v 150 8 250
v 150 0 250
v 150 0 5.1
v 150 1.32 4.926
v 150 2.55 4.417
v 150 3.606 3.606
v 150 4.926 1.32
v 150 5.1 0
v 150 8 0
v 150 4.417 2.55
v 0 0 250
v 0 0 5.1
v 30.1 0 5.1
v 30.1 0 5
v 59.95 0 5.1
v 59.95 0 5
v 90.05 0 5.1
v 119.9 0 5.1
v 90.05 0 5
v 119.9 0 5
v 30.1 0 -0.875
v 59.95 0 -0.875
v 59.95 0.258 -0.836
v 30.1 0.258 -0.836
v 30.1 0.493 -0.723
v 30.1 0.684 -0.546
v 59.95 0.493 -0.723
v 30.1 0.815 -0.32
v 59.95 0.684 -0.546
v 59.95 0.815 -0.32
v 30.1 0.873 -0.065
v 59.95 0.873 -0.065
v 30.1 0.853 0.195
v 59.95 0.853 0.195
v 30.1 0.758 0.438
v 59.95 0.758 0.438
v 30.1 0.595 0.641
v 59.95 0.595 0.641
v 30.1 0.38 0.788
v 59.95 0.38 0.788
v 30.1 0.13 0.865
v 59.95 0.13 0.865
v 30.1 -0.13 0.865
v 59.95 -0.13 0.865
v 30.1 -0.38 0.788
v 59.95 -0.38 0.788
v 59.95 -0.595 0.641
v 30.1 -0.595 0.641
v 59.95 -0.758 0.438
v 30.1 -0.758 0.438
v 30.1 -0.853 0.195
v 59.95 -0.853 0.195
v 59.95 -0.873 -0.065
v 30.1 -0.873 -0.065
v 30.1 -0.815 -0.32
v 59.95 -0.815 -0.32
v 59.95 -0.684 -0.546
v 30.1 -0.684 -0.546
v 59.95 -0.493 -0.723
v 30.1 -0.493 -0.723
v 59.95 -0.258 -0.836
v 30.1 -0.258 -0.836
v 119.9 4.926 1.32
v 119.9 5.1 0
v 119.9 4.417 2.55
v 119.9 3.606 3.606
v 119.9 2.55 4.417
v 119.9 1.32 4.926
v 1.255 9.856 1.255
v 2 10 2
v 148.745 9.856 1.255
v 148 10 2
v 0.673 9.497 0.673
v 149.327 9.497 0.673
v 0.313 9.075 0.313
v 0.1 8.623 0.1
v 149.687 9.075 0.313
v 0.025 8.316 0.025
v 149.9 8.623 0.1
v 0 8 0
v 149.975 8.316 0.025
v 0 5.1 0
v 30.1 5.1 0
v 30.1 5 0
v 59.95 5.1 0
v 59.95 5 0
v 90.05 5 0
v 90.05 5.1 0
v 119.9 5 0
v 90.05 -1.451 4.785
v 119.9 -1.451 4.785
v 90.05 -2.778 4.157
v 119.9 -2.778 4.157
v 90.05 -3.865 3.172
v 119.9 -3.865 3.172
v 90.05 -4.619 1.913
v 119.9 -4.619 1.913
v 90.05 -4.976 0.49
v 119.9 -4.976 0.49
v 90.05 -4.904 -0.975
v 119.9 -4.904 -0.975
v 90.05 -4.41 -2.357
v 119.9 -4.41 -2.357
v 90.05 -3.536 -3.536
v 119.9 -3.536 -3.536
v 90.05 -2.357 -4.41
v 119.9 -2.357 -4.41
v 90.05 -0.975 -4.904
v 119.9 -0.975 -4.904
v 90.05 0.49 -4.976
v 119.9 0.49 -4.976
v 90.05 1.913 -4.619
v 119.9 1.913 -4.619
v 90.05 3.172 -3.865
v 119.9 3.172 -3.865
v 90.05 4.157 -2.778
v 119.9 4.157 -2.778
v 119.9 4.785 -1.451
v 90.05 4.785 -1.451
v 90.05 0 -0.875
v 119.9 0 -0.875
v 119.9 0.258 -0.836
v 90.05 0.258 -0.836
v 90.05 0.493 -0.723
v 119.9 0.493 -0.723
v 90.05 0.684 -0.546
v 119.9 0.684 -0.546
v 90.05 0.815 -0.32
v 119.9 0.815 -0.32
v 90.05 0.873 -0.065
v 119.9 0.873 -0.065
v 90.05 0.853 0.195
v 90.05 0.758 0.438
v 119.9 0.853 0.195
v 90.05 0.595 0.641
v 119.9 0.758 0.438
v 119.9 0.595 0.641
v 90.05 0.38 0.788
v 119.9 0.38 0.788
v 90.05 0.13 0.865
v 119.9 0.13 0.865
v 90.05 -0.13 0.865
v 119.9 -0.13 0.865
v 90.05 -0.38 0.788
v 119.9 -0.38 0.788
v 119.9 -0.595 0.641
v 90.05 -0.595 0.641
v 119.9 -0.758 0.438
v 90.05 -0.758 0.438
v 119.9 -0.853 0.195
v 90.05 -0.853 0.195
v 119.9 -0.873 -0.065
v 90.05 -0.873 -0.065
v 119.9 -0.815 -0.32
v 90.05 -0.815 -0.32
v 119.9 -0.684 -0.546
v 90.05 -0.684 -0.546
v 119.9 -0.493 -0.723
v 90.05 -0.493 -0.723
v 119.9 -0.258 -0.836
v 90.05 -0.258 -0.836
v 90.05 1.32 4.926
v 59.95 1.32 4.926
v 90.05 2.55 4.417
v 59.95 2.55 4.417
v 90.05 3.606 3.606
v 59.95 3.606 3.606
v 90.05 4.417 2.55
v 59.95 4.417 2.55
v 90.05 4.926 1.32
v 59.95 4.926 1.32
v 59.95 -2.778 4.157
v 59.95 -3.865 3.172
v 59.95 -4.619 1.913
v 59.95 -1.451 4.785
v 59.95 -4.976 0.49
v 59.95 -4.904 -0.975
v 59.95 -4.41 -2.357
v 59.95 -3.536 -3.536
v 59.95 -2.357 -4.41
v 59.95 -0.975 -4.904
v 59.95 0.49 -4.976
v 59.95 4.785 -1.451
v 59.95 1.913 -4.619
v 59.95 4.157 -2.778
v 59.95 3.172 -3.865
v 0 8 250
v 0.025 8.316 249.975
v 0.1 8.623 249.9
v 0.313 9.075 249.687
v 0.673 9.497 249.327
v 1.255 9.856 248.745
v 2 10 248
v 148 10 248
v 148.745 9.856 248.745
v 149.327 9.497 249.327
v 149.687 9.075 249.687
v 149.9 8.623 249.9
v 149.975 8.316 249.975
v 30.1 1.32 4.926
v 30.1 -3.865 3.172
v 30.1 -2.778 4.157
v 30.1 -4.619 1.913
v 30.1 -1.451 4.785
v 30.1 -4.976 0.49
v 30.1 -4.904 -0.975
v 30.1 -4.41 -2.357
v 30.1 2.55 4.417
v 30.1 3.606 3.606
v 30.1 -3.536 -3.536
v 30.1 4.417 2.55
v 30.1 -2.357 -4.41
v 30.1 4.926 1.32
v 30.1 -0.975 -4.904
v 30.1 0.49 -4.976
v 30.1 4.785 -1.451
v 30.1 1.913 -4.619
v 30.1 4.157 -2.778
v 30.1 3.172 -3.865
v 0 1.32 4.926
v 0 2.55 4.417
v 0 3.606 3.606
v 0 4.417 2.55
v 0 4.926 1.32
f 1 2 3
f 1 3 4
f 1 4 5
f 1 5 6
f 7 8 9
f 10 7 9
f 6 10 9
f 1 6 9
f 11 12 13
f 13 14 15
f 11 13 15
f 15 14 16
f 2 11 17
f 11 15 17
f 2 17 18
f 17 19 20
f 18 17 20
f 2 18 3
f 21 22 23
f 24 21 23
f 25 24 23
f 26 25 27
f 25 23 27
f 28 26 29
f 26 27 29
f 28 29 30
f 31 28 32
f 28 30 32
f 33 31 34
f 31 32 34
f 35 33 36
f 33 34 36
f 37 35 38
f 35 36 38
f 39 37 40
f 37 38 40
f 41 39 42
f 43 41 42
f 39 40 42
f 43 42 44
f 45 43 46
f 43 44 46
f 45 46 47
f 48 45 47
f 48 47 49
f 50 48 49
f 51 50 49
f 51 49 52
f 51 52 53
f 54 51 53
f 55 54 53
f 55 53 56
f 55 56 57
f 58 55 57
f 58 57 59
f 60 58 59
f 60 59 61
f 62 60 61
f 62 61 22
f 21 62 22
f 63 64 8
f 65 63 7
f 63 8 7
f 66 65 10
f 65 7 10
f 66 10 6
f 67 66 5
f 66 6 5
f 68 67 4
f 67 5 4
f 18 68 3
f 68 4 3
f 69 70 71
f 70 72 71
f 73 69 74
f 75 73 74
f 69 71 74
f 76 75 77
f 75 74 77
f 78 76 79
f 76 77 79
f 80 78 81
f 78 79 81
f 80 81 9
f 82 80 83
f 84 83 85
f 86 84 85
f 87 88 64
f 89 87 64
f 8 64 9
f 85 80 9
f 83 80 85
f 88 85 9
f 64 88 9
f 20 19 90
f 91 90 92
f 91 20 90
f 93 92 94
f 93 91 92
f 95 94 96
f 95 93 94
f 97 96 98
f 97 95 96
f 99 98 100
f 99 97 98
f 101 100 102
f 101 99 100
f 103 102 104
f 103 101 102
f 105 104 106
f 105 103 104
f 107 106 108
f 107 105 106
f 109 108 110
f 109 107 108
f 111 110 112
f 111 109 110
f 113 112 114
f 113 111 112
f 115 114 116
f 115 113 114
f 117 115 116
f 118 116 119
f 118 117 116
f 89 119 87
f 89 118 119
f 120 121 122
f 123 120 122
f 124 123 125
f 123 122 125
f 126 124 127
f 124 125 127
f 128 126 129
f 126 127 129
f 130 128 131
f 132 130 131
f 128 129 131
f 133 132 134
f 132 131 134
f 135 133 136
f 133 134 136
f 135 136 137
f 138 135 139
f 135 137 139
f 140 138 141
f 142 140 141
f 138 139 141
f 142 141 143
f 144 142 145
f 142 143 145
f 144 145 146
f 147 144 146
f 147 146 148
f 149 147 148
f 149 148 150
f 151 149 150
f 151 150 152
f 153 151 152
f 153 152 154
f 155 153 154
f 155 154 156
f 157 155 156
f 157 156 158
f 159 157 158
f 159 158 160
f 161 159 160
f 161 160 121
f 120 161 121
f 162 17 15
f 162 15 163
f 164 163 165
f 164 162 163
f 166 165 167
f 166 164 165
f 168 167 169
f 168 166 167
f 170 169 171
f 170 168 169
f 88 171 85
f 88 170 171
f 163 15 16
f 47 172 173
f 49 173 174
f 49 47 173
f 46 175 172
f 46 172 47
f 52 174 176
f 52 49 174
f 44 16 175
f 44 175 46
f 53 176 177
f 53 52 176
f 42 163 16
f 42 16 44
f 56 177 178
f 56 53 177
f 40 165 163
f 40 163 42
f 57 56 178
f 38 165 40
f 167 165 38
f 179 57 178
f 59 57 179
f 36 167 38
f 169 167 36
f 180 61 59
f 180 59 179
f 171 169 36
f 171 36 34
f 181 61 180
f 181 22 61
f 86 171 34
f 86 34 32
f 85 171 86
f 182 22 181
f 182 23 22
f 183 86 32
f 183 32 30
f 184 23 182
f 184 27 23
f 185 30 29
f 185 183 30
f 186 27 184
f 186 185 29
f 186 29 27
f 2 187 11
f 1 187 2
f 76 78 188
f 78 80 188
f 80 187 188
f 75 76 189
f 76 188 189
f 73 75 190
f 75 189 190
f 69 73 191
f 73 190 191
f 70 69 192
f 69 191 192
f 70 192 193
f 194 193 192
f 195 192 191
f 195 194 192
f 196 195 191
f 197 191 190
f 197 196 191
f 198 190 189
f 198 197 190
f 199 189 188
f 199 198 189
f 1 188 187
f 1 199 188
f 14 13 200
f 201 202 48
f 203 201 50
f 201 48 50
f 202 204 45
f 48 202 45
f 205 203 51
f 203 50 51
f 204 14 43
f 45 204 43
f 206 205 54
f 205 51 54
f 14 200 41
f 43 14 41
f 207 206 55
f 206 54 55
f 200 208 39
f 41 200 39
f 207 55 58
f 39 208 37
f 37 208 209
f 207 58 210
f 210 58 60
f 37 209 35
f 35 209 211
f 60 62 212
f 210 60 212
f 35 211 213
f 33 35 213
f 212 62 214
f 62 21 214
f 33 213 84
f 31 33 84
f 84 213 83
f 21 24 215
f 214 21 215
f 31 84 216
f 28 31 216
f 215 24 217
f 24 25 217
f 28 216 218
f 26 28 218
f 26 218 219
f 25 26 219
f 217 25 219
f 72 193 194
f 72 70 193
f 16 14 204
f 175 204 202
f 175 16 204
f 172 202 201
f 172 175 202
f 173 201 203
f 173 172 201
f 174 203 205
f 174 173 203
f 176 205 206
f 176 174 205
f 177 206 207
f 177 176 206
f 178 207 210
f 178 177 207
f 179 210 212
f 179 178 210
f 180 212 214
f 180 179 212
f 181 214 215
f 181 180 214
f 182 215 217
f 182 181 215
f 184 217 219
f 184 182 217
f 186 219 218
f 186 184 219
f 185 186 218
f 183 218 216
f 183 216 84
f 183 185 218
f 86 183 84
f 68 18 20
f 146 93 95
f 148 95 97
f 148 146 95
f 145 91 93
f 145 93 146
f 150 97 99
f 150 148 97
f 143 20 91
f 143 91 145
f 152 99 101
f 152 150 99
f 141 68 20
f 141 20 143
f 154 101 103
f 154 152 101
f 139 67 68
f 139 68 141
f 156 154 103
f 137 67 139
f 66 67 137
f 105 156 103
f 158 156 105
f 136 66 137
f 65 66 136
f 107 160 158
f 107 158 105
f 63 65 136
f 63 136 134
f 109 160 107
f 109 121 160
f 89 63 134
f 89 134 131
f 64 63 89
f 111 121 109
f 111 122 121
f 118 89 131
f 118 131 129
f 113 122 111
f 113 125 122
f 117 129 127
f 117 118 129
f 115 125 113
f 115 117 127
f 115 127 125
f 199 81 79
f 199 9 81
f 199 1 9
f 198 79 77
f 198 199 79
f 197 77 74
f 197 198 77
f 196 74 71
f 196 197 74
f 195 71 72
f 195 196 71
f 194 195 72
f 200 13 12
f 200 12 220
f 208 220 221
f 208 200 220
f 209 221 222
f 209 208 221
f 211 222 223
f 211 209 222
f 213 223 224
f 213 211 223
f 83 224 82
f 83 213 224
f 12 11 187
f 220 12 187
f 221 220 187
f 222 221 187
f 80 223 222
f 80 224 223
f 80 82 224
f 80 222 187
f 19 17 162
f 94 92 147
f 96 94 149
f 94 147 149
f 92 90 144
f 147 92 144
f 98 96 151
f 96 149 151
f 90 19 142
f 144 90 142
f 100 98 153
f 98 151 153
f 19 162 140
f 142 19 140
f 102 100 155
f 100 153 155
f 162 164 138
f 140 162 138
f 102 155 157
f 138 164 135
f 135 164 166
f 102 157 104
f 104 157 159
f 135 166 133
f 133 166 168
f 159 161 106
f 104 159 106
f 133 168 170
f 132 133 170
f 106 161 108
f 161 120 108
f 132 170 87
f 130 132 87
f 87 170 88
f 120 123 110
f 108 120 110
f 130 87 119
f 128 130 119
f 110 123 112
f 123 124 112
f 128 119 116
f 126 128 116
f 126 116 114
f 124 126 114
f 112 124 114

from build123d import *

# Parameters (mm, degrees)
SKETCH1_W           = 150
SKETCH1_H           = 10
BOSS_EXTRUDE1_DEPTH = 250
FILLET1_R           = 2
SKETCH2_R           = 5.1
CUT_EXTRUDE1_DEPTH  = 30.1
SKETCH3_R           = 5
BOSS_EXTRUDE2_DEPTH = 29.85
SKETCH4_R           = 5.1
CUT_EXTRUDE2_DEPTH  = 30.1
SKETCH5_R           = 5
BOSS_EXTRUDE3_DEPTH = 29.85
SKETCH6_R           = 5.1
CUT_EXTRUDE3_DEPTH  = 30.1
SKETCH7_R           = 0.875
CUT_EXTRUDE4_DEPTH  = 90.1


with BuildPart() as part:
    # Sketch1 → Boss-Extrude1 (new body)
    with BuildSketch(Plane.XY):
        with Locations((75, 5)):
            Rectangle(SKETCH1_W, SKETCH1_H)
    extrude(amount=BOSS_EXTRUDE1_DEPTH)

    # Fillet1
    fillet1_edges = [part.edges().sort_by_distance(p)[0] for p in [
        (75, 10, 250),
        (75, 10, 0),
        (0, 10, 125),
        (150, 10, 125),
    ]]
    fillet(fillet1_edges, radius=FILLET1_R)

    # Sketch2 → Cut-Extrude1 (cut)
    with BuildSketch(Plane(origin=(150, 0, 0), x_dir=(0, 0, -1), z_dir=(1, 0, 0))):
        Circle(SKETCH2_R)
    extrude(amount=-CUT_EXTRUDE1_DEPTH, mode=Mode.SUBTRACT)

    # Sketch3 → Boss-Extrude2 (add)
    with BuildSketch(Plane(origin=(119.9, 0, 0), x_dir=(0, 0, -1), z_dir=(1, 0, 0))):
        Circle(SKETCH3_R)
    extrude(amount=-BOSS_EXTRUDE2_DEPTH)

    # Sketch4 → Cut-Extrude2 (cut)
    with BuildSketch(Plane.ZY.offset(-90.05)):
        Circle(SKETCH4_R)
    extrude(amount=CUT_EXTRUDE2_DEPTH, mode=Mode.SUBTRACT)

    # Sketch5 → Boss-Extrude3 (add)
    with BuildSketch(Plane(origin=(59.95, 0, 0), x_dir=(0, 0, -1), z_dir=(1, 0, 0))):
        Circle(SKETCH5_R)
    extrude(amount=-BOSS_EXTRUDE3_DEPTH)

    # Sketch6 → Cut-Extrude3 (cut)
    with BuildSketch(Plane.ZY.offset(-30.1)):
        Circle(SKETCH6_R)
    extrude(amount=CUT_EXTRUDE3_DEPTH, mode=Mode.SUBTRACT)

    # Sketch7 → Cut-Extrude4 (cut)
    with BuildSketch(Plane(origin=(119.9, 0, 0), x_dir=(0, 0, -1), z_dir=(1, 0, 0))):
        Circle(SKETCH7_R)
    extrude(amount=-CUT_EXTRUDE4_DEPTH, mode=Mode.SUBTRACT)


solid = part.part
